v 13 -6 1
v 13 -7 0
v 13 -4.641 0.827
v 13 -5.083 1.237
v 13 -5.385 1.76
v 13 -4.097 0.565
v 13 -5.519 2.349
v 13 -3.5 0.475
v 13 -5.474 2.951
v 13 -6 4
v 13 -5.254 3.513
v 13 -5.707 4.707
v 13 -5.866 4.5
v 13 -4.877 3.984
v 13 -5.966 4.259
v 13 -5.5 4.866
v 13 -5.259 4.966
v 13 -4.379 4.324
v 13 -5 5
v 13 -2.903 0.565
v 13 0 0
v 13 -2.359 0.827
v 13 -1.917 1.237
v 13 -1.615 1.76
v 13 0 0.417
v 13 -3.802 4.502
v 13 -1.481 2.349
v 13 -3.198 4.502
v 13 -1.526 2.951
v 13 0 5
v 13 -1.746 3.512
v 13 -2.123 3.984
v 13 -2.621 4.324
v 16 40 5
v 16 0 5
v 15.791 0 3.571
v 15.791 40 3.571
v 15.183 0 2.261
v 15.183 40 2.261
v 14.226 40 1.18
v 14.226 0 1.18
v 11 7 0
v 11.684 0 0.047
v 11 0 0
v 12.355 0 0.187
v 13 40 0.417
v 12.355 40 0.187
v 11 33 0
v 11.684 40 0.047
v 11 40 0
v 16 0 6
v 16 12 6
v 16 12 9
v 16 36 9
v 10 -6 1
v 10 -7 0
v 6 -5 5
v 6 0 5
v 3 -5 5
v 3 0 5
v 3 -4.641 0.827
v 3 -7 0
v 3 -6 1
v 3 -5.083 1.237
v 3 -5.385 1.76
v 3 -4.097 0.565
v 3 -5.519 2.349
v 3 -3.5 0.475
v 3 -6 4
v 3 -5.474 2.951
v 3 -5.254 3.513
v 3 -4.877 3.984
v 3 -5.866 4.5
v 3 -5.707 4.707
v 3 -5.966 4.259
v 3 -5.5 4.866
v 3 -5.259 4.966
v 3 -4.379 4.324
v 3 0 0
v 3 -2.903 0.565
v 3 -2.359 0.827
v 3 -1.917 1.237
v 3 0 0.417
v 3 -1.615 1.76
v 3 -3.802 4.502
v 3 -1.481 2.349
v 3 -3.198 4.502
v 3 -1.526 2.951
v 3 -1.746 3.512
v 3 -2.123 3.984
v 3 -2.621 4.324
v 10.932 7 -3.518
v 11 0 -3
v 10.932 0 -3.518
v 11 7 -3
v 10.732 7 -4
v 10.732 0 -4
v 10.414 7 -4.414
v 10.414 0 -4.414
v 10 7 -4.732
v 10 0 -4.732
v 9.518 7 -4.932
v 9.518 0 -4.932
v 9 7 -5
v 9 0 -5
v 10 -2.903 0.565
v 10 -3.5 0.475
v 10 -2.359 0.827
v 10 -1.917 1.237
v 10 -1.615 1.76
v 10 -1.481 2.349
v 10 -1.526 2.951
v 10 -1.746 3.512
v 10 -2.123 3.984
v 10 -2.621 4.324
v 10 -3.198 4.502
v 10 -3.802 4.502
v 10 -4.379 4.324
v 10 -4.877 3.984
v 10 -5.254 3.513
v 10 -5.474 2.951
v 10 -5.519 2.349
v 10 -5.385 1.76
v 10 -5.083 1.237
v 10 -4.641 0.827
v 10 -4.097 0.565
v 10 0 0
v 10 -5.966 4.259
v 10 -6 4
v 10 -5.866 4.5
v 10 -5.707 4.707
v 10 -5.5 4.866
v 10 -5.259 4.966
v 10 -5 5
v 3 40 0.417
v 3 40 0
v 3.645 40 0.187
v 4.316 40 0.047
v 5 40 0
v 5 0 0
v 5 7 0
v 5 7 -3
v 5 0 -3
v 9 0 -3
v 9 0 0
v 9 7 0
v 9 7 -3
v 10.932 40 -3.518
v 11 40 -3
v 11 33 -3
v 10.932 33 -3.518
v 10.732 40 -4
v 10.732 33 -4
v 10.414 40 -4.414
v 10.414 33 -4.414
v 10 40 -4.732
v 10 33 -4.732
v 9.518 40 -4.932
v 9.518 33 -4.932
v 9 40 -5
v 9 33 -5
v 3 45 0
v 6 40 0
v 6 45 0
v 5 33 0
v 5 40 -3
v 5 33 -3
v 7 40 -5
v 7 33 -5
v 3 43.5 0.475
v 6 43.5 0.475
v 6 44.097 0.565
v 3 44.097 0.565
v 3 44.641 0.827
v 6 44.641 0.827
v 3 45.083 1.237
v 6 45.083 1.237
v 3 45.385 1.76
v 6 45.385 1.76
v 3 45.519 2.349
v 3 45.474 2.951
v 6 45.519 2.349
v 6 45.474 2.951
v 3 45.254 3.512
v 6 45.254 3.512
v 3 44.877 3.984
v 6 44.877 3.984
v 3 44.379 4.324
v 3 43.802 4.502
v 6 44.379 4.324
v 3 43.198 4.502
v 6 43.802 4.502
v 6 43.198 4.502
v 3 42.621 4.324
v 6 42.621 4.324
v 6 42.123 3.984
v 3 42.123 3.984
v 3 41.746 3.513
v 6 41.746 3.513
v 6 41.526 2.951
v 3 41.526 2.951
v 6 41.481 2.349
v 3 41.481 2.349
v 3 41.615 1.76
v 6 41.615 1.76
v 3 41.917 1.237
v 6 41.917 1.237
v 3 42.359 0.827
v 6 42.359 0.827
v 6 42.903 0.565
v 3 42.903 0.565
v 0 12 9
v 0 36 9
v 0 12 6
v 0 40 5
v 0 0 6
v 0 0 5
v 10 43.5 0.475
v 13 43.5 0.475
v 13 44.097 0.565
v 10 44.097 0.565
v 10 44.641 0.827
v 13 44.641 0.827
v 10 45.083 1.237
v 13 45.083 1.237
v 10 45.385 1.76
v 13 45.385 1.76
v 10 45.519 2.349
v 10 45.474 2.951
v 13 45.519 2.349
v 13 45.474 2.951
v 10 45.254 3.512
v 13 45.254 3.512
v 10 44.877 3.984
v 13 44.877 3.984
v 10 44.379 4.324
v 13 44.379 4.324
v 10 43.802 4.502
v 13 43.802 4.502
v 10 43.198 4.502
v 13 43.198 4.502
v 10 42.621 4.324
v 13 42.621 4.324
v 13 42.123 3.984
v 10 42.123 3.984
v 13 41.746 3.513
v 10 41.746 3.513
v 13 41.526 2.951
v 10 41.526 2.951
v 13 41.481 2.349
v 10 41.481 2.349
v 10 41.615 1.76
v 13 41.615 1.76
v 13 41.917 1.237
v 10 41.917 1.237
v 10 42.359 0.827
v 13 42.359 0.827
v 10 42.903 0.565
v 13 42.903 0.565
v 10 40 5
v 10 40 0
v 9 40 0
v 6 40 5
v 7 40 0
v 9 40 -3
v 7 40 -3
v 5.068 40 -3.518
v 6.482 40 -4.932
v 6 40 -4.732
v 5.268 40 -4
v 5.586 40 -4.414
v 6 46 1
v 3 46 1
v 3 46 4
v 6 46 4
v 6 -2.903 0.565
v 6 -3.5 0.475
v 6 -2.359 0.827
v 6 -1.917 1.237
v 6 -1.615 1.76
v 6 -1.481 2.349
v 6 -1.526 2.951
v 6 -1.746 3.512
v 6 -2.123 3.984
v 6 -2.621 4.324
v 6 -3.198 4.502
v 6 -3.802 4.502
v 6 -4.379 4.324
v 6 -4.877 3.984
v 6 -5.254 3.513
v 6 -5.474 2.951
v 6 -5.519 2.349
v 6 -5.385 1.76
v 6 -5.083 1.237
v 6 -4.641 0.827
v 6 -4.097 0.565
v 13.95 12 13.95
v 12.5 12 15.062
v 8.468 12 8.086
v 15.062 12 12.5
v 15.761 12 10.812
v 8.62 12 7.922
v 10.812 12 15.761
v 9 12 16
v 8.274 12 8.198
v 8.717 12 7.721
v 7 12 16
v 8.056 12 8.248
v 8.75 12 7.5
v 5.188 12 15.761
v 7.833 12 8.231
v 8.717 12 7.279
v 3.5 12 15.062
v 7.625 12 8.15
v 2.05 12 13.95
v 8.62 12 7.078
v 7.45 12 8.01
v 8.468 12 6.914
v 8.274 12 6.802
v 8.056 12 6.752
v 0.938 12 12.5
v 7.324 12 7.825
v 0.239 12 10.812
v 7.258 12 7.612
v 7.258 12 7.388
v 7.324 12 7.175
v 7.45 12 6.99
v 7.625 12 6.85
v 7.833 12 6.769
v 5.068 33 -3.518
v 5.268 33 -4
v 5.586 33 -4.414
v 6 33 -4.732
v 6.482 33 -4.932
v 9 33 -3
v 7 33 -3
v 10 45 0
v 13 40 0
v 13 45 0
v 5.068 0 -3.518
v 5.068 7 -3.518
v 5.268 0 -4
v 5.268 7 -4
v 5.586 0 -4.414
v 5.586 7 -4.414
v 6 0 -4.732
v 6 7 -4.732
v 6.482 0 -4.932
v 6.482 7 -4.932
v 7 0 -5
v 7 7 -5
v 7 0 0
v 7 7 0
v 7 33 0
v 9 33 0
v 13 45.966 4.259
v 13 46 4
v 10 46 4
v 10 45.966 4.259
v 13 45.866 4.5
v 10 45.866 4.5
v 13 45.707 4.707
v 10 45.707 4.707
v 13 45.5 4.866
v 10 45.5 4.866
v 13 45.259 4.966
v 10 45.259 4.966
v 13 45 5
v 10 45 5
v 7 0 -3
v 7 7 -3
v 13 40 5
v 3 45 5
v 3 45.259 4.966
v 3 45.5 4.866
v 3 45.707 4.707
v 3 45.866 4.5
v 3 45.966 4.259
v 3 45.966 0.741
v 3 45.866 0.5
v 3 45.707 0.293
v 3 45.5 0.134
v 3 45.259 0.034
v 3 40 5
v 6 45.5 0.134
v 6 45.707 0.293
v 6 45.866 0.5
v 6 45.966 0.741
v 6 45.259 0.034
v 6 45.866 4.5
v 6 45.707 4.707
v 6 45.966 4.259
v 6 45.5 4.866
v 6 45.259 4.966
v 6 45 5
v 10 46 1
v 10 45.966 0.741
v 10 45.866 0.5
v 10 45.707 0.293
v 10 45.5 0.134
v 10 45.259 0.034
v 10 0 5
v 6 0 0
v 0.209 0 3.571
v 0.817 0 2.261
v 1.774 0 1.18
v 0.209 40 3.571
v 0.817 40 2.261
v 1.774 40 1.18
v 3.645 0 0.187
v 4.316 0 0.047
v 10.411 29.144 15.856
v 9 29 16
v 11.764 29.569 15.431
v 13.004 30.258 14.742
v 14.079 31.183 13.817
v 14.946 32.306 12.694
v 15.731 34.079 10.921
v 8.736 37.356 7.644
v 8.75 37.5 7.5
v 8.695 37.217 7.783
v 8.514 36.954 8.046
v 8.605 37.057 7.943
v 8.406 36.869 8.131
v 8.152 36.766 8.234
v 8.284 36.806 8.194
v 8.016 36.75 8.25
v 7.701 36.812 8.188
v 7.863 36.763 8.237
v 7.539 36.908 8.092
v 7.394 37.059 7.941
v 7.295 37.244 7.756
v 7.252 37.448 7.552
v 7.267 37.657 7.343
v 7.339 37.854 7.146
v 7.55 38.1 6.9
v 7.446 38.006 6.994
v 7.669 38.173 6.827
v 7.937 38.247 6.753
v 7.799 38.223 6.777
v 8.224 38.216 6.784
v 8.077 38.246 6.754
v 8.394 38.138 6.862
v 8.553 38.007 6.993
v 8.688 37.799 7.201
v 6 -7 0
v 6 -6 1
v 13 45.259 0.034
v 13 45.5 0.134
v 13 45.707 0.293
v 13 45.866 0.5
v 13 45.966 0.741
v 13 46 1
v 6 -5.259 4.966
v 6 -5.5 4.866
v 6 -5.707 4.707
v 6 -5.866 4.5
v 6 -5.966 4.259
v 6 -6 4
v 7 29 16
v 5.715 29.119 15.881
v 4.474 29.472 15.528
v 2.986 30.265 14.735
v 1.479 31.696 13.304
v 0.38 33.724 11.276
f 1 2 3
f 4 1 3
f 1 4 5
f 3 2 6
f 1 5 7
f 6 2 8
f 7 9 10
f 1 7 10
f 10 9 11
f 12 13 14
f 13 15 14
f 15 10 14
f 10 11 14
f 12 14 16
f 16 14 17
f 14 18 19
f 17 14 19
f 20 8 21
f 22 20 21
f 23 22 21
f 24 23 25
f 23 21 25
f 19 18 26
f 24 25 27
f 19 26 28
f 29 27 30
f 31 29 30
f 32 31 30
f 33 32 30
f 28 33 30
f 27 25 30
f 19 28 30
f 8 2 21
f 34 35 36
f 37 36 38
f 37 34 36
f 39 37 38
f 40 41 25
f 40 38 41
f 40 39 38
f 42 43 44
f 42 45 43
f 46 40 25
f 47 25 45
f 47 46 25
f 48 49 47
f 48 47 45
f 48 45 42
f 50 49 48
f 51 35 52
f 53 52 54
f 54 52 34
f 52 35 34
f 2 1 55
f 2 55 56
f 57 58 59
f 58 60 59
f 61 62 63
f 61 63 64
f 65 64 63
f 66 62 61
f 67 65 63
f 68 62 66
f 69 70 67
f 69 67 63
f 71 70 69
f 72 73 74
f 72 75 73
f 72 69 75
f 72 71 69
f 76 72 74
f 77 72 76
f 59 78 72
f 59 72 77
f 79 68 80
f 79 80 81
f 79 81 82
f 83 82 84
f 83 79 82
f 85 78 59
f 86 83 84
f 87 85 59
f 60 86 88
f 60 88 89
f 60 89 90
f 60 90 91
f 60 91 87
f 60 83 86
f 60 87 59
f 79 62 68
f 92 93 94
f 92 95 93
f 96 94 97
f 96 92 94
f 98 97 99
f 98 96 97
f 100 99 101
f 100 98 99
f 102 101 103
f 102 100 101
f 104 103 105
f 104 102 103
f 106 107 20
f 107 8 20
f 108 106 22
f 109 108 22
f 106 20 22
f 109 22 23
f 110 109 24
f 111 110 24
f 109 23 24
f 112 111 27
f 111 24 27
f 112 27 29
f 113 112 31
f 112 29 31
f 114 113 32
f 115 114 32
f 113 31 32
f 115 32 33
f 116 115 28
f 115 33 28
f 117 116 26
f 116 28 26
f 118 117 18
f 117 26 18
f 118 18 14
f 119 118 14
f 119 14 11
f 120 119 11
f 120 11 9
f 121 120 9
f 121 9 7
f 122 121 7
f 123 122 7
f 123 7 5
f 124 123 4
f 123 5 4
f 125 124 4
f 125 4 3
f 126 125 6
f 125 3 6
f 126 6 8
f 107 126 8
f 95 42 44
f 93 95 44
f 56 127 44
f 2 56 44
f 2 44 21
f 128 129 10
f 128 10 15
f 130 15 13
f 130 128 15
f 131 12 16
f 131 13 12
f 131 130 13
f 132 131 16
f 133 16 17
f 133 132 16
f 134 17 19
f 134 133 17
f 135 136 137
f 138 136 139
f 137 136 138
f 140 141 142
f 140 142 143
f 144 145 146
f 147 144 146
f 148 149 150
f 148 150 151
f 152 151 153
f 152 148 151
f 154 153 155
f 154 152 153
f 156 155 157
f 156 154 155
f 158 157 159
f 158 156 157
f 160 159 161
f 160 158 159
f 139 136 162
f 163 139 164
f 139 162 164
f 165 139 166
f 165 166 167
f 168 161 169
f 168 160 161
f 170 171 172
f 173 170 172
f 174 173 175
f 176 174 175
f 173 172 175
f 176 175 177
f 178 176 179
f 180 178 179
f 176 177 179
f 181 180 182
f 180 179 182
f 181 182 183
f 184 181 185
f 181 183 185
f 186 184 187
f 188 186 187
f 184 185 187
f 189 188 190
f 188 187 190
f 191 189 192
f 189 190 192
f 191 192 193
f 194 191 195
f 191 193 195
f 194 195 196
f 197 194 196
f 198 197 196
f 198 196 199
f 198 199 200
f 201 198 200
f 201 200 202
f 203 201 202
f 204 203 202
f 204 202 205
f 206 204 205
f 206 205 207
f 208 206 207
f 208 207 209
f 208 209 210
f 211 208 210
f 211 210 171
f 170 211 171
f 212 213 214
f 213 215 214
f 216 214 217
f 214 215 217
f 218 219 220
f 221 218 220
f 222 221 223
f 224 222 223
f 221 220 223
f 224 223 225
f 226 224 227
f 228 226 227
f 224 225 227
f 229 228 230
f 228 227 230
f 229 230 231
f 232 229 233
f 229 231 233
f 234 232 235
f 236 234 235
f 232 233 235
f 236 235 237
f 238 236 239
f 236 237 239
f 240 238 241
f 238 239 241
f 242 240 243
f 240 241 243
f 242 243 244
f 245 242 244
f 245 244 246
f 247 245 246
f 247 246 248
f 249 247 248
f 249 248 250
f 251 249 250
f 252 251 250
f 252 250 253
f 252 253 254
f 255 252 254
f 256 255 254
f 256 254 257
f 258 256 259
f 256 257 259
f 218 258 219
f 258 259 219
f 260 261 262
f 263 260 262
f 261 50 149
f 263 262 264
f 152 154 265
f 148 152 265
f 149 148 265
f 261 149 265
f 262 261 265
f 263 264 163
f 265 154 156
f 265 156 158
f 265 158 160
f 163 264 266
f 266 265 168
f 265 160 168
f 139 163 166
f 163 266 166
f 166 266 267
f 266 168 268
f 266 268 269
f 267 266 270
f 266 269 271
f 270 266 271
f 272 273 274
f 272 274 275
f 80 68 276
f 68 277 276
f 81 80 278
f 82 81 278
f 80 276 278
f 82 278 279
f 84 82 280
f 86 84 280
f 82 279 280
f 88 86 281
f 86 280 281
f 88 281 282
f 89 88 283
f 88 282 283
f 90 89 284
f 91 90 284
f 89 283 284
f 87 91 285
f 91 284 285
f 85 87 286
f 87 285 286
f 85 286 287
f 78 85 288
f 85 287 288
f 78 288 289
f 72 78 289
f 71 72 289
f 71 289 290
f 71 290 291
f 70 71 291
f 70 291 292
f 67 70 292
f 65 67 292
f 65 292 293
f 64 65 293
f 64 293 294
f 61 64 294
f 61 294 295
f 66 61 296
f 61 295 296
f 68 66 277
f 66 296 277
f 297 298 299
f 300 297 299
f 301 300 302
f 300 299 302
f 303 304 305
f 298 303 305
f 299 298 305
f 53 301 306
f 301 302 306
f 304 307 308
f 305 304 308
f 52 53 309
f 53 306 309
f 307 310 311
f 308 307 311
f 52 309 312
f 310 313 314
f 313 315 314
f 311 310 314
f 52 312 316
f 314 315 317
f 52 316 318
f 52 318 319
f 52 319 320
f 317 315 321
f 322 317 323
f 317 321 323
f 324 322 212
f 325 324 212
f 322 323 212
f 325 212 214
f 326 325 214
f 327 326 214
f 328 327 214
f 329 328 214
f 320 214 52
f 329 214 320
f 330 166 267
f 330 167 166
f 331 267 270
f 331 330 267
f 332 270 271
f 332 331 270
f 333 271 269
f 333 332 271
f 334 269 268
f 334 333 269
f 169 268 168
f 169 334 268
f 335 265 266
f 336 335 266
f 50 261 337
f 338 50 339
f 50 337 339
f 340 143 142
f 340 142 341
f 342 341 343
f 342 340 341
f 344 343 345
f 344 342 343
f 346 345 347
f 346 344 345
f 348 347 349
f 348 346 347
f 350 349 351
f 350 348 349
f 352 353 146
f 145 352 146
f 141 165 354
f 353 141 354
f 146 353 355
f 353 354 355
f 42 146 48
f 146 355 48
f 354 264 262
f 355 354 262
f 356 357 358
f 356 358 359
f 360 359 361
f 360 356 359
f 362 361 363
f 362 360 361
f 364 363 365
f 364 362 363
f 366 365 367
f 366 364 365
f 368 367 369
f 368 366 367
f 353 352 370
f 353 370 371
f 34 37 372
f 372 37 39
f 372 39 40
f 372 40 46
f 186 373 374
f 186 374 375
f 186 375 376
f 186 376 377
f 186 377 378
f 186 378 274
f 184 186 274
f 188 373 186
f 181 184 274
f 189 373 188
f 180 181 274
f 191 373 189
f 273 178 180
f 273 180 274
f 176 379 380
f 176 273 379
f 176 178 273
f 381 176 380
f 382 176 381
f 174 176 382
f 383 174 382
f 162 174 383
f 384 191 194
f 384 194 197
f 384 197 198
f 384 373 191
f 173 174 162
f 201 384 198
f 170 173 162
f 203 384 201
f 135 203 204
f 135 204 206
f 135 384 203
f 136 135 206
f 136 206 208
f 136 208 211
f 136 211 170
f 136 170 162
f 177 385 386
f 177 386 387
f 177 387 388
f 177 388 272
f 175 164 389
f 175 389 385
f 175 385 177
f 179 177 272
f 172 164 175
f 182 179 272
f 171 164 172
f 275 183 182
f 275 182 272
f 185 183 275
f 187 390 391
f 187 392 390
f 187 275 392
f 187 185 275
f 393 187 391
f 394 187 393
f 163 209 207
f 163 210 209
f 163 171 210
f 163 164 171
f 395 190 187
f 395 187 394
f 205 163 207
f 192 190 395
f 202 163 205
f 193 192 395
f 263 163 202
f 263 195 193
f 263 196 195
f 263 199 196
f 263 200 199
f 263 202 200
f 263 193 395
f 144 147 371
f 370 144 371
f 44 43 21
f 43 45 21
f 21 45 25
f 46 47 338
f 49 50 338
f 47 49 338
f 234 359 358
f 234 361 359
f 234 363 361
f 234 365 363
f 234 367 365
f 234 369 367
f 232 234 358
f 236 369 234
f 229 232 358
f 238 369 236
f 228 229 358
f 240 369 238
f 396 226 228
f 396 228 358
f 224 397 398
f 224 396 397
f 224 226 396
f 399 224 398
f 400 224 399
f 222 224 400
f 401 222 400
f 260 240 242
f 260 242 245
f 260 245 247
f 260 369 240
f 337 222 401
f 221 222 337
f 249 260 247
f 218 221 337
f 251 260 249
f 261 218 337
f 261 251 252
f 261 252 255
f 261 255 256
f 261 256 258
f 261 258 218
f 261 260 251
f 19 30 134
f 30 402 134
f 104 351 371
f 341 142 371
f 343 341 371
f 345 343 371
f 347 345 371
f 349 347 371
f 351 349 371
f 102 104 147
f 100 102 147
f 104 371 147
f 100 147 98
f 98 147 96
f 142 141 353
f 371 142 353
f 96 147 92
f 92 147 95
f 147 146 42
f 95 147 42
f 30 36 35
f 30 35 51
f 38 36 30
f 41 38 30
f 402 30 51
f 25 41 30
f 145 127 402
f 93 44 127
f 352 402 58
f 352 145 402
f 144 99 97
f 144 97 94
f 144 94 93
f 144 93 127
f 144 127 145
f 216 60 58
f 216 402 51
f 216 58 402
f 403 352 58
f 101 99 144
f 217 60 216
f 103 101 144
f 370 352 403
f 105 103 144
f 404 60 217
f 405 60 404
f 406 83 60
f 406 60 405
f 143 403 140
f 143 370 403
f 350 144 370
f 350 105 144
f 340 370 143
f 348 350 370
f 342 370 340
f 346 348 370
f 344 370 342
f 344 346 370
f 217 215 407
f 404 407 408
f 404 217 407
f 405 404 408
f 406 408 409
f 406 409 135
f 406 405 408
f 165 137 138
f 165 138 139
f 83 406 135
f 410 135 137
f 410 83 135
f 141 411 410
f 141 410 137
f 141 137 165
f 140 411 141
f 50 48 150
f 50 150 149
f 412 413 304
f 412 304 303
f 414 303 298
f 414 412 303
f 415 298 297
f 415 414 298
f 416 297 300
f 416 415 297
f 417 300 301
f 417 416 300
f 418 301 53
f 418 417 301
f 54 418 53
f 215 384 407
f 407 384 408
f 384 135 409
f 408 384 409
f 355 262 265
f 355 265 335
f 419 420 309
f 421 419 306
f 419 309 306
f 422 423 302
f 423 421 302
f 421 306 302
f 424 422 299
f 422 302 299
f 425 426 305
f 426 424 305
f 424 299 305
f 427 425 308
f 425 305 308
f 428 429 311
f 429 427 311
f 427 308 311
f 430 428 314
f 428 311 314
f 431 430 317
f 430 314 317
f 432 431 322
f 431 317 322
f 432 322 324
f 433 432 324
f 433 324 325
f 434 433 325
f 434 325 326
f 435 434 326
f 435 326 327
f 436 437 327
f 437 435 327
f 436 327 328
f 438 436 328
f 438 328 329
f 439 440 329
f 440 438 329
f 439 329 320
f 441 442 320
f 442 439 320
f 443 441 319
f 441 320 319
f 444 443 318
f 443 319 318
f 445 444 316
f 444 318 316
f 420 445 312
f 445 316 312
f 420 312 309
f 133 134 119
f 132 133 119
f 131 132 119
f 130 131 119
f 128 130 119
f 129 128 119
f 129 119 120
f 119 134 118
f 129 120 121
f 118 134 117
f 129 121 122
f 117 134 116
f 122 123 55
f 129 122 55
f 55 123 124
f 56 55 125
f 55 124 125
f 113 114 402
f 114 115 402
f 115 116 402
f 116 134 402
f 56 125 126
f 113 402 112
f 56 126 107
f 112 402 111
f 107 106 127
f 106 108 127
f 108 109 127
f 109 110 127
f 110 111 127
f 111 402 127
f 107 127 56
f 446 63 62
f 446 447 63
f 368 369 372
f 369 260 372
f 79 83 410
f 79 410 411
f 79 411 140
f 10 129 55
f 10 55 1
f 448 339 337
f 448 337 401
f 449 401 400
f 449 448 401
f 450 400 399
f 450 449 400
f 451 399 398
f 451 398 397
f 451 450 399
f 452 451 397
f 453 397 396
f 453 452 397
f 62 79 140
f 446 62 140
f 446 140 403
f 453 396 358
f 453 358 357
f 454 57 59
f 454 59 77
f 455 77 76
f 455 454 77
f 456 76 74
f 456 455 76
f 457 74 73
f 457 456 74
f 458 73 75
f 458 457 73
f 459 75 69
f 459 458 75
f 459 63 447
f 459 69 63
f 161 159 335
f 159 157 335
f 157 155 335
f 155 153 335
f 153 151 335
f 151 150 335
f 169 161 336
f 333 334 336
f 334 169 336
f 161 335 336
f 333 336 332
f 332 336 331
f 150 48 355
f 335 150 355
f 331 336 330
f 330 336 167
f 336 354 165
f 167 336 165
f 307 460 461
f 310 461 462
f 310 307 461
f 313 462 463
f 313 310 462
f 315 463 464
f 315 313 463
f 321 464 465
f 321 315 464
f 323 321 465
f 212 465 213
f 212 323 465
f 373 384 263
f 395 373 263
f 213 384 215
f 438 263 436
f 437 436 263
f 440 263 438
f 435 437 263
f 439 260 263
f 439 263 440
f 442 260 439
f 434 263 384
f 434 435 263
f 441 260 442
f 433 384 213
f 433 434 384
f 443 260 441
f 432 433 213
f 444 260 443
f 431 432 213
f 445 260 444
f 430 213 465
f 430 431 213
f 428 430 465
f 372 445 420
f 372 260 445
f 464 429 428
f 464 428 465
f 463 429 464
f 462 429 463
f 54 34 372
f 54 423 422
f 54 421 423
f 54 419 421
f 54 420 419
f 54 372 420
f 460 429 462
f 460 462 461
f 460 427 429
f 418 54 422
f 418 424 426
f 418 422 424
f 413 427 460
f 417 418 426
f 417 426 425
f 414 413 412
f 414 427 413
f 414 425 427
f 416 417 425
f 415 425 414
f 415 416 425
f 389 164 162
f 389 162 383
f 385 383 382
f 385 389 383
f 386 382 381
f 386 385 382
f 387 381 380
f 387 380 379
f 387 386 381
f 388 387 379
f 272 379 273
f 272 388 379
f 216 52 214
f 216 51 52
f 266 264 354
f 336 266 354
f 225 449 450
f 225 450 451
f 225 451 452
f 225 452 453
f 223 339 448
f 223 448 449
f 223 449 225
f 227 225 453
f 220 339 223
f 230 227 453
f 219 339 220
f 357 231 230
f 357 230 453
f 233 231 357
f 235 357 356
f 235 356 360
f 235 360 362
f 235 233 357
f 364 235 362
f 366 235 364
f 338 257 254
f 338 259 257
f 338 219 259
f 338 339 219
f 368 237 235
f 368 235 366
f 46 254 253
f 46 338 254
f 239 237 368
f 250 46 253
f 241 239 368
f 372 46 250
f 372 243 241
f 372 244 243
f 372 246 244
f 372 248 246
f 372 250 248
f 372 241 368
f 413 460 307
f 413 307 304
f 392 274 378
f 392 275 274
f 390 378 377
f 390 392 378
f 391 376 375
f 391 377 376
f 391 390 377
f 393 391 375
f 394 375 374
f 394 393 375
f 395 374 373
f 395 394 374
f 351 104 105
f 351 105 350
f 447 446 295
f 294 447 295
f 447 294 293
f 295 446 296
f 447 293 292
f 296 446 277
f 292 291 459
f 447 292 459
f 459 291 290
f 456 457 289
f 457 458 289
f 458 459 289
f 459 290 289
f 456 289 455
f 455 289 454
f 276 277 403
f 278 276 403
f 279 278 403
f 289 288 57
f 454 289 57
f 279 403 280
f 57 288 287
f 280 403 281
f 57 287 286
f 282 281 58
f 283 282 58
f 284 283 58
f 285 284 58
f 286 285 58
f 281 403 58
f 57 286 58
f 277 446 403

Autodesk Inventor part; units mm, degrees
ref_plane "YZ Plane" through (0, 0, 0) normal (1, 0, 0) x (0, 1, 0)
ref_plane "XZ Plane" through (0, 0, 0) normal (0, 1, 0) x (-1, 0, 0)
ref_plane "XY Plane" through (0, 0, 0) normal (0, 0, 1) x (1, 0, 0)
sketch "Sketch2" plane through (0, 0, 0) normal (0, 0, 1) x (1, 0, 0)
  line L0 (0, 0) -> (16, 0)
  line L1 (16, 0) -> (16, 40)
  line L2 (16, 40) -> (0, 40)
  line L3 (0, 40) -> (0, 0)
  dimension "d0" = 16
  dimension "d1" = 40
extrude "Extrusion1" add sketch "Sketch2" along normal blind 16
fillet "Fillet1" radius 7 2 edges at (16, 20, 16) (0, 20, 16)
fillet "Fillet2" radius 5 2 edges at (16, 20, 0) (0, 20, 0)
sketch "Sketch3" plane through (16, 0, 9) normal (1, 0, 0) x (0, 0, -1)
  line L0 (4, 0) -> (4, 40) projected
  line L1 (4, 40) -> (-7, 29)
  line L2 (-7, 0) -> (-7, 40) projected
  line L3 (4, 40) -> (19.5563, 40) construction
  line L4 (-7, 29) -> (-7, 40)
  line L5 (-7, 40) -> (4, 40)
  line L6 (1, 0) -> (12.3137, 0) construction
  line L7 (-7, 8) -> (-7, 0)
  line L8 (1, 0) -> (19.9296, 0) construction
  line L9 (-7, 17.1561) -> (-7, 8)
  point P0 (9, 0)
  dimension "d6" = 135
extrude "Extrusion2" cut sketch "Sketch3" against normal through all
sketch "Sketch4" plane through (5, 40, 0) normal (0, 1, 0) x (1, 0, 0)
  line L0 (1, -4.25) -> (5, -0.75) construction
  line L1 (-5, -5) -> (11, -5) projected
  line L2 (1, -5) -> (-2, -5)
  line L3 (-2, -5) -> (-2, 0)
  line L4 (-2, 0) -> (1, 0)
  line L5 (1, 0) -> (1, -5)
  line L6 (5, 0) -> (8, 0)
  line L7 (8, 0) -> (8, -5)
  line L8 (8, -5) -> (5, -5)
  line L9 (5, -5) -> (5, 0)
  point P0 (-5, 0)
  point P1 (-1.888, -0.75)
  point P2 (-1.888, -4.25)
  dimension "d58" = 3
  dimension "d79" = 4
extrude "Extrusion3" add sketch "Sketch4" along normal blind 6
sketch "Sketch6" plane through (5, 0, 0) normal (0, -1, 0) x (1, 0, 0)
  line L0 (5, 0) -> (1, 0) projected
  line L1 (8, 0.4174) -> (8, 5) projected
  line L2 (5, 0) -> (8, 0)
  line L3 (8, 0) -> (8, 5)
  line L4 (8, 5) -> (5, 5)
  line L5 (5, 5) -> (5, 0)
  line L6 (-2, 0) -> (-2, 0.4174) projected
  line L7 (-2, 5) -> (1, 5) projected
  line L8 (-2, 0) -> (1, 0)
  line L9 (1, 0) -> (1, 5)
  line L10 (1, 5) -> (-2, 5)
  line L11 (-2, 5) -> (-2, 0)
  point P0 (-5, 0)
  point P1 (-1.888, 0.75)
  point P2 (1, 0.75)
  point P3 (1, 4.25)
extrude "Extrusion5" add sketch "Sketch6" along normal blind 6
sketch "Sketch11" plane through (0, 0, 5) normal (-1, 0, 0) x (0, 0, 1)
  line L0 (0, 40) -> (0, 0) projected
  line L1 (11, 0) -> (11, 29) projected
  line L2 (0, 0) -> (11, 0)
  line L3 (11, 0) -> (11, 12)
  line L4 (11, 12) -> (0, 12)
  line L5 (0, 12) -> (0, 0)
  point P0 (-5, 0)
  dimension "d36" = 12
extrude "Extrusion9" cut sketch "Sketch11" against normal through all
sketch "Sketch12" plane through (0, 0, 0) normal (0, 0, -1) x (-1, 0, 0)
  line L0 (-10, 40) -> (-12.888, 40) projected
  line L1 (-11, 40) -> (-9, 40)
  line L2 (-9, 40) -> (-9, 33)
  line L3 (-9, 33) -> (-11, 33)
  line L4 (-11, 33) -> (-11, 40)
  line L5 (-5, 40) -> (-5, 0) projected
  line L6 (-5, 40) -> (-7, 40)
  line L7 (-7, 40) -> (-7, 33)
  line L8 (-7, 33) -> (-5, 33)
  line L9 (-5, 33) -> (-5, 40)
  line L10 (-12.888, 0) -> (-10, 0) projected
  line L11 (-11, 0) -> (-9, 0)
  line L12 (-9, 0) -> (-9, 7)
  line L13 (-9, 7) -> (-11, 7)
  line L14 (-11, 7) -> (-11, 0)
  line L15 (-5, 0) -> (-7, 0)
  line L16 (-7, 0) -> (-7, 7)
  line L17 (-7, 7) -> (-5, 7)
  line L18 (-5, 7) -> (-5, 0)
  point P0 (0, 0)
  point P1 (-5, 0)
  dimension "d39" = 2
  dimension "d40" = 7
  dimension "d41" = 2
  dimension "d42" = 7
  dimension "d43" = 2
  dimension "d44" = 7
  dimension "d45" = 2
  dimension "d46" = 7
extrude "Extrusion10" add sketch "Sketch12" along normal blind 3
sketch "Sketch13" plane through (0, 0, -3) normal (0, 0, -1) x (-1, 0, 0)
  line L0 (-16, 40) -> (-13, 40) projected
  line L1 (-11, 40) -> (-10, 40) projected
  line L2 (-5, 40) -> (-5, 33) projected
  line L3 (-11, 40) -> (-5, 40)
  line L4 (-5, 40) -> (-5, 33)
  line L5 (-5, 33) -> (-11, 33)
  line L6 (-11, 33) -> (-11, 40)
  line L7 (-11, 7) -> (-11, 33) projected
  line L8 (-3, 0) -> (-5, 0) projected
  line L9 (-11, 7) -> (-5, 7)
  line L10 (-5, 7) -> (-5, 0)
  line L11 (-5, 0) -> (-11, 0)
  line L12 (-11, 0) -> (-11, 7)
  point P0 (0, 0)
extrude "Extrusion11" add sketch "Sketch13" along normal blind 2
sketch "Sketch14" plane through (0, 12, 5) normal (0, -1, 0) x (1, 0, 0)
  circle A0 centre (8, 2.5) radius 0.75
  line L0 (16, 0) -> (0, 0) projected
  line L1 (16, 4) -> (16, 0) projected
  point P0 (0, -5)
  point P1 (16, 2)
  dimension "d52" = 1.5
  dimension "d55" = 2.5
  dimension "d56" = 8
extrude "Extrusion12" cut sketch "Sketch14" against normal through all
fillet "Fillet5" radius 2 4 edges at (11, 3.5, -5) (5, 3.5, -5) (11, 36.5, -5) (5, 36.5, -5)
sketch "Sketch15" plane through (13, 40, 0.4174) normal (1, 0, 0) x (0, 0, -1)
  circle A0 centre (-2.0826, 3.5) radius 2.025
  line L0 (0.4174, 0) -> (0.4174, 6) projected
  line L1 (-4.5826, 6) -> (0.4174, 6) projected
  point P0 (0.4174, -40)
  point P1 (0.4174, 3)
  dimension "d60" = 4.05
  dimension "d61" = 2.5
  dimension "d62" = 2.5
extrude "Extrusion13" cut sketch "Sketch15" against normal through all
fillet "Fillet6" radius 1 4 edges at (11.5, 46, 0) (11.5, 46, 5) (4.5, 46, 0) (4.5, 46, 5)
sketch "Sketch16" plane through (13, 0, 0.4174) normal (1, 0, 0) x (0, 0, -1)
  circle A0 centre (-2.0826, -3.5) radius 2.025
  line L0 (0.4174, 0) -> (0.4174, -6) projected
  line L1 (0.4174, -6) -> (-4.5826, -6) projected
  dimension "d66" = 4.05
  dimension "d67" = 2.5
  dimension "d68" = 2.5
extrude "Extrusion14" cut sketch "Sketch16" against normal through all
fillet "Fillet7" radius 1 2 edges at (4.5, -6, 5) (11.5, -6, 5)
sketch "Sketch17" plane through (5, -6, 0) normal (0, -1, 0) x (1, 0, 0)
  line L0 (8, 0) -> (8, 0.4174) projected
  line L1 (5, 0) -> (5, 5) projected
  line L2 (8, 0) -> (5, 0)
  line L3 (5, 0) -> (5, 1)
  line L4 (5, 1) -> (8, 1)
  line L5 (8, 1) -> (8, 0)
  line L6 (-2, 0) -> (1, 0) projected
  line L7 (-2, 0) -> (1, 0)
  line L8 (1, 0) -> (1, 1)
  line L9 (1, 1) -> (-2, 1)
  line L10 (-2, 1) -> (-2, 0)
  point P0 (-5, 0)
  dimension "d72" = 1
extrude "Extrusion15" add sketch "Sketch17" along normal blind 1
sketch "Sketch18" plane through (13, 0, 0.4174) normal (1, 0, 0) x (0, 0, -1)
  line L0 (-3.5826, -6) -> (-0.5826, -6) projected
  line L1 (0.4174, 0) -> (0.4174, -7) projected
  line L2 (-0.5826, -6) -> (0.4174, -7)
  line L3 (0.4174, -7) -> (-0.5826, -7)
  line L4 (-0.5826, -7) -> (-0.5826, -6)
extrude "Extrusion16" cut sketch "Sketch18" against normal through all
sketch "Sketch19" plane through (6, 0, 5) normal (0, 0, 1) x (-1, 0, 0)
  line L0 (-10, -12) -> (-10, -36) projected
  line L1 (-3, 0) -> (6, 0) projected
  line L2 (-10, -12) -> (6, -12)
  line L3 (6, -12) -> (6, 0)
  line L4 (6, 0) -> (-10, 0)
  line L5 (-10, 0) -> (-10, -12)
extrude "Extrusion17" add sketch "Sketch19" along normal blind 1
properties part number "FingerBase"
